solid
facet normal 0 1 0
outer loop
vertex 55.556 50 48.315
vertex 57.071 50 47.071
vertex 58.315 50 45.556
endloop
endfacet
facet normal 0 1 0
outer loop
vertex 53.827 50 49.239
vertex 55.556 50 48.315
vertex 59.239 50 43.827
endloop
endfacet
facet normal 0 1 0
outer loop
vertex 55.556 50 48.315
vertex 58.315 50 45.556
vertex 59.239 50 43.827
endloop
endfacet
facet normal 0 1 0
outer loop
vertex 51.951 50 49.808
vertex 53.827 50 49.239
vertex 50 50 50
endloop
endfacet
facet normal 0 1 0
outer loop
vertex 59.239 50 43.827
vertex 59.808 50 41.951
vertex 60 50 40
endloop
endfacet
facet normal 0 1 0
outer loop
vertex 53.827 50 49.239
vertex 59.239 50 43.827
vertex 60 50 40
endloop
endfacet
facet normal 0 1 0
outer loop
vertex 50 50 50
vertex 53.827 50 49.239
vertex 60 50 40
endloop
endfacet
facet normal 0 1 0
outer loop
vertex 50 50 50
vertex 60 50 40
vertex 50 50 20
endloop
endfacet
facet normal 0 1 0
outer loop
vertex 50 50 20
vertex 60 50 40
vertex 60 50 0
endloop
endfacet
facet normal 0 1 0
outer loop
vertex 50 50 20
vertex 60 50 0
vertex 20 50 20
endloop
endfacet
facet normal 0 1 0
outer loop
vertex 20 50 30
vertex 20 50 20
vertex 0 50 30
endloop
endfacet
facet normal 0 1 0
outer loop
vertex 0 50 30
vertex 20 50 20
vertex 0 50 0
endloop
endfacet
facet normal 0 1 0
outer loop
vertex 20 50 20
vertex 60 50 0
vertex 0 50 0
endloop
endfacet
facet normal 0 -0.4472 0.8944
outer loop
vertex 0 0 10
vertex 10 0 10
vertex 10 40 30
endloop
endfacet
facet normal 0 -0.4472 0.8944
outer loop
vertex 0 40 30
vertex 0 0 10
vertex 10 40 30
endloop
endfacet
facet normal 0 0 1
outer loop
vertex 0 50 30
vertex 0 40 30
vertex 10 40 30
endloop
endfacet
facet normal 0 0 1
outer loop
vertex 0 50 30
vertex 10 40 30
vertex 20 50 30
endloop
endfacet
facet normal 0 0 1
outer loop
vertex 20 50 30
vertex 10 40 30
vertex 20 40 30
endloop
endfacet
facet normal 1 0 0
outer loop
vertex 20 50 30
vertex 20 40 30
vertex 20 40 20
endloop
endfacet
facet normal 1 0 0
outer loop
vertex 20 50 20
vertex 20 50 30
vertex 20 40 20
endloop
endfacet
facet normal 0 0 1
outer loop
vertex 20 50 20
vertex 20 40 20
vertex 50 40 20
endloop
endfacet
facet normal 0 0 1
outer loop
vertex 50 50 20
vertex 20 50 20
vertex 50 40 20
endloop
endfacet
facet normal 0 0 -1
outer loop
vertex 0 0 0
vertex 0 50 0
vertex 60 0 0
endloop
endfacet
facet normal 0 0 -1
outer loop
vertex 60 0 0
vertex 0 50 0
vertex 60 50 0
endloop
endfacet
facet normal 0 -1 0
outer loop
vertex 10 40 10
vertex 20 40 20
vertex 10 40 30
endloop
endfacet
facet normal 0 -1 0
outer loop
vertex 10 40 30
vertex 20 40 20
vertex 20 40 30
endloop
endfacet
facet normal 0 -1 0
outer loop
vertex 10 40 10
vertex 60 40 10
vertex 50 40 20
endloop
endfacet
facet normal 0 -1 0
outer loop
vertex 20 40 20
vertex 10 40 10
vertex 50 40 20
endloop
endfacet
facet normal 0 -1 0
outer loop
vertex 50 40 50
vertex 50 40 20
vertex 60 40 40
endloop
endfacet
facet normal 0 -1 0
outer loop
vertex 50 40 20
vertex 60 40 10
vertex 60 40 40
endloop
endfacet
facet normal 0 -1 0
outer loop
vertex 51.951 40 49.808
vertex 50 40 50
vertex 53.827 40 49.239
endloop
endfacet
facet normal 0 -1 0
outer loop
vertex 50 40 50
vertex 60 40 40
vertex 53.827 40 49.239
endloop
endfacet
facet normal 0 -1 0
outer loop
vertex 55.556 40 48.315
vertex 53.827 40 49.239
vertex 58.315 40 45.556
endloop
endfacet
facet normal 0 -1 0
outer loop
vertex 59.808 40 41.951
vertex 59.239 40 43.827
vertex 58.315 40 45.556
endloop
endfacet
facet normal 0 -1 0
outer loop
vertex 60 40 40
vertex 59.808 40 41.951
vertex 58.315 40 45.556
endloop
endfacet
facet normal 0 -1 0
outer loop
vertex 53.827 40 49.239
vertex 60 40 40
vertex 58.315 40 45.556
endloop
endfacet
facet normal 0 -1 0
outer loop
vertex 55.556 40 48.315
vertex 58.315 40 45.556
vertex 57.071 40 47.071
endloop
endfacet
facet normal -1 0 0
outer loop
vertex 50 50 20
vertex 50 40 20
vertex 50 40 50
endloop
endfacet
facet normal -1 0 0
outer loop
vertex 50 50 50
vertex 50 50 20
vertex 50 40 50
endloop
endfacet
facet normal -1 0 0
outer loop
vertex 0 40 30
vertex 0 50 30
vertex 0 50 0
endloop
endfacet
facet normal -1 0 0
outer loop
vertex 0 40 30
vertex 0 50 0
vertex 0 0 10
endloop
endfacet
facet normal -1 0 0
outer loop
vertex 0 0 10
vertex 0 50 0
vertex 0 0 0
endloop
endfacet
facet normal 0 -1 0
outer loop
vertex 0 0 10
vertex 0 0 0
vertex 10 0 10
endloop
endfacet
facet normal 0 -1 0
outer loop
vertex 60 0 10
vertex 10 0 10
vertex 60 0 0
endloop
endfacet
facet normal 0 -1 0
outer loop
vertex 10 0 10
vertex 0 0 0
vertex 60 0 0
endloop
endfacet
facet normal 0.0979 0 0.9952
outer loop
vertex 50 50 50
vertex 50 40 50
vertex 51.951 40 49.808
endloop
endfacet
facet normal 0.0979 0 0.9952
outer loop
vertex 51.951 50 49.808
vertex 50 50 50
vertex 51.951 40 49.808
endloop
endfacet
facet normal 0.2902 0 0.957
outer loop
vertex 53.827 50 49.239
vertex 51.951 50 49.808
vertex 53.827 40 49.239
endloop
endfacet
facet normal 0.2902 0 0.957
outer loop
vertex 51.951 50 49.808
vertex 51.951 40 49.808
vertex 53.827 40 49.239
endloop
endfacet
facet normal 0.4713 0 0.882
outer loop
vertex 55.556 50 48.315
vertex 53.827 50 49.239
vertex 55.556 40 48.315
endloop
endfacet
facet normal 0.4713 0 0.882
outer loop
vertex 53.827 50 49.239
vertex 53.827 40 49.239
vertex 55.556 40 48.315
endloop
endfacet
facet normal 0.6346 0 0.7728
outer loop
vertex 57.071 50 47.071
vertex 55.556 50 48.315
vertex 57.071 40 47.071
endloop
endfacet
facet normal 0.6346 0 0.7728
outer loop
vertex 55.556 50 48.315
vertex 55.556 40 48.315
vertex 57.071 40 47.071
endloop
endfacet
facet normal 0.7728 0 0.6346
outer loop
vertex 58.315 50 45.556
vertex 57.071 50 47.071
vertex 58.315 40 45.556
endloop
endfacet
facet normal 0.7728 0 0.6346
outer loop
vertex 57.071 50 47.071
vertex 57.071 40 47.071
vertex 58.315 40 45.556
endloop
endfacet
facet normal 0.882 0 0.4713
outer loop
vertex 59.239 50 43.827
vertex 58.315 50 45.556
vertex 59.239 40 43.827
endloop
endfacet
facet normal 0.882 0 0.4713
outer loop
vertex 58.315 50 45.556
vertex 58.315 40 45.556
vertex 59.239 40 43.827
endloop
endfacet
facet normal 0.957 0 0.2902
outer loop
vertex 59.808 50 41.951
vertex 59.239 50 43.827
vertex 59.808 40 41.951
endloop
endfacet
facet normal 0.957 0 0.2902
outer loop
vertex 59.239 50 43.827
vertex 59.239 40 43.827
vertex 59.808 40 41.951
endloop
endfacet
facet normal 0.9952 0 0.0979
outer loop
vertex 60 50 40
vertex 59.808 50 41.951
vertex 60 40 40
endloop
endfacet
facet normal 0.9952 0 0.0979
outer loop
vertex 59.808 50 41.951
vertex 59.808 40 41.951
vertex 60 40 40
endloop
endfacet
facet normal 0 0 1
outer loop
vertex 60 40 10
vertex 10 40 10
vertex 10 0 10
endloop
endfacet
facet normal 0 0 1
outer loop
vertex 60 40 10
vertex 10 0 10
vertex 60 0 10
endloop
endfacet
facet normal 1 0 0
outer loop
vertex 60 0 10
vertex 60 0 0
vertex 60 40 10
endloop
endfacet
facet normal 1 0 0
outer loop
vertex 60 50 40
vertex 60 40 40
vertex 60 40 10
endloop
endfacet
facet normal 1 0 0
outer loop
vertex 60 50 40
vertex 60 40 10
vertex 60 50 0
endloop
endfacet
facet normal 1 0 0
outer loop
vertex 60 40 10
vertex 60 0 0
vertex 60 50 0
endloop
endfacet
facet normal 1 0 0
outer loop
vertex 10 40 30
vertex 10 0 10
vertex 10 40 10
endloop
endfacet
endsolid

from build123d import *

# Parameters (mm, degrees)
F0_W     = 60
F0_H     = 50
F1_DEPTH = 10
F3_DEPTH = 40
F5_DEPTH = 10.001
F7_DEPTH = 10.001


with BuildPart() as f1:
    # F0 (on Top) → F1 (new body)
    with BuildSketch(Plane.XY):
        with Locations((30, 25)):
            Rectangle(F0_W, F0_H)
    extrude(amount=F1_DEPTH)

    # F2 (on face) → F3 (join)
    with BuildSketch(Plane.XY.offset(10)):
        Polygon((0, 0), (10, 0), (10, 40), (60, 40), (60, 50), (0, 50), align=None)
    extrude(amount=F3_DEPTH)

    # F4 (on face) → F5 (cut, through all)
    with BuildSketch(Plane.YZ.offset(10)):
        Polygon((0, 10), (40, 30), (40, 50), (0, 50), align=None)
    extrude(amount=-F5_DEPTH, mode=Mode.SUBTRACT)

    # F6 (on face) → F7 (cut, through all)
    with BuildSketch(Plane.XZ.offset(-40)):
        with BuildLine():
            Line((60, 50), (50, 50))
            ThreePointArc((50, 50), (57.071068, 47.071068), (60, 40))
            Line((60, 40), (60, 50))
        make_face()
        Polygon((0, 50), (0, 30), (10, 30), (20, 30), (20, 20), (50, 20), (50, 50), align=None)
    extrude(amount=-F7_DEPTH, mode=Mode.SUBTRACT)


solid = f1.part
